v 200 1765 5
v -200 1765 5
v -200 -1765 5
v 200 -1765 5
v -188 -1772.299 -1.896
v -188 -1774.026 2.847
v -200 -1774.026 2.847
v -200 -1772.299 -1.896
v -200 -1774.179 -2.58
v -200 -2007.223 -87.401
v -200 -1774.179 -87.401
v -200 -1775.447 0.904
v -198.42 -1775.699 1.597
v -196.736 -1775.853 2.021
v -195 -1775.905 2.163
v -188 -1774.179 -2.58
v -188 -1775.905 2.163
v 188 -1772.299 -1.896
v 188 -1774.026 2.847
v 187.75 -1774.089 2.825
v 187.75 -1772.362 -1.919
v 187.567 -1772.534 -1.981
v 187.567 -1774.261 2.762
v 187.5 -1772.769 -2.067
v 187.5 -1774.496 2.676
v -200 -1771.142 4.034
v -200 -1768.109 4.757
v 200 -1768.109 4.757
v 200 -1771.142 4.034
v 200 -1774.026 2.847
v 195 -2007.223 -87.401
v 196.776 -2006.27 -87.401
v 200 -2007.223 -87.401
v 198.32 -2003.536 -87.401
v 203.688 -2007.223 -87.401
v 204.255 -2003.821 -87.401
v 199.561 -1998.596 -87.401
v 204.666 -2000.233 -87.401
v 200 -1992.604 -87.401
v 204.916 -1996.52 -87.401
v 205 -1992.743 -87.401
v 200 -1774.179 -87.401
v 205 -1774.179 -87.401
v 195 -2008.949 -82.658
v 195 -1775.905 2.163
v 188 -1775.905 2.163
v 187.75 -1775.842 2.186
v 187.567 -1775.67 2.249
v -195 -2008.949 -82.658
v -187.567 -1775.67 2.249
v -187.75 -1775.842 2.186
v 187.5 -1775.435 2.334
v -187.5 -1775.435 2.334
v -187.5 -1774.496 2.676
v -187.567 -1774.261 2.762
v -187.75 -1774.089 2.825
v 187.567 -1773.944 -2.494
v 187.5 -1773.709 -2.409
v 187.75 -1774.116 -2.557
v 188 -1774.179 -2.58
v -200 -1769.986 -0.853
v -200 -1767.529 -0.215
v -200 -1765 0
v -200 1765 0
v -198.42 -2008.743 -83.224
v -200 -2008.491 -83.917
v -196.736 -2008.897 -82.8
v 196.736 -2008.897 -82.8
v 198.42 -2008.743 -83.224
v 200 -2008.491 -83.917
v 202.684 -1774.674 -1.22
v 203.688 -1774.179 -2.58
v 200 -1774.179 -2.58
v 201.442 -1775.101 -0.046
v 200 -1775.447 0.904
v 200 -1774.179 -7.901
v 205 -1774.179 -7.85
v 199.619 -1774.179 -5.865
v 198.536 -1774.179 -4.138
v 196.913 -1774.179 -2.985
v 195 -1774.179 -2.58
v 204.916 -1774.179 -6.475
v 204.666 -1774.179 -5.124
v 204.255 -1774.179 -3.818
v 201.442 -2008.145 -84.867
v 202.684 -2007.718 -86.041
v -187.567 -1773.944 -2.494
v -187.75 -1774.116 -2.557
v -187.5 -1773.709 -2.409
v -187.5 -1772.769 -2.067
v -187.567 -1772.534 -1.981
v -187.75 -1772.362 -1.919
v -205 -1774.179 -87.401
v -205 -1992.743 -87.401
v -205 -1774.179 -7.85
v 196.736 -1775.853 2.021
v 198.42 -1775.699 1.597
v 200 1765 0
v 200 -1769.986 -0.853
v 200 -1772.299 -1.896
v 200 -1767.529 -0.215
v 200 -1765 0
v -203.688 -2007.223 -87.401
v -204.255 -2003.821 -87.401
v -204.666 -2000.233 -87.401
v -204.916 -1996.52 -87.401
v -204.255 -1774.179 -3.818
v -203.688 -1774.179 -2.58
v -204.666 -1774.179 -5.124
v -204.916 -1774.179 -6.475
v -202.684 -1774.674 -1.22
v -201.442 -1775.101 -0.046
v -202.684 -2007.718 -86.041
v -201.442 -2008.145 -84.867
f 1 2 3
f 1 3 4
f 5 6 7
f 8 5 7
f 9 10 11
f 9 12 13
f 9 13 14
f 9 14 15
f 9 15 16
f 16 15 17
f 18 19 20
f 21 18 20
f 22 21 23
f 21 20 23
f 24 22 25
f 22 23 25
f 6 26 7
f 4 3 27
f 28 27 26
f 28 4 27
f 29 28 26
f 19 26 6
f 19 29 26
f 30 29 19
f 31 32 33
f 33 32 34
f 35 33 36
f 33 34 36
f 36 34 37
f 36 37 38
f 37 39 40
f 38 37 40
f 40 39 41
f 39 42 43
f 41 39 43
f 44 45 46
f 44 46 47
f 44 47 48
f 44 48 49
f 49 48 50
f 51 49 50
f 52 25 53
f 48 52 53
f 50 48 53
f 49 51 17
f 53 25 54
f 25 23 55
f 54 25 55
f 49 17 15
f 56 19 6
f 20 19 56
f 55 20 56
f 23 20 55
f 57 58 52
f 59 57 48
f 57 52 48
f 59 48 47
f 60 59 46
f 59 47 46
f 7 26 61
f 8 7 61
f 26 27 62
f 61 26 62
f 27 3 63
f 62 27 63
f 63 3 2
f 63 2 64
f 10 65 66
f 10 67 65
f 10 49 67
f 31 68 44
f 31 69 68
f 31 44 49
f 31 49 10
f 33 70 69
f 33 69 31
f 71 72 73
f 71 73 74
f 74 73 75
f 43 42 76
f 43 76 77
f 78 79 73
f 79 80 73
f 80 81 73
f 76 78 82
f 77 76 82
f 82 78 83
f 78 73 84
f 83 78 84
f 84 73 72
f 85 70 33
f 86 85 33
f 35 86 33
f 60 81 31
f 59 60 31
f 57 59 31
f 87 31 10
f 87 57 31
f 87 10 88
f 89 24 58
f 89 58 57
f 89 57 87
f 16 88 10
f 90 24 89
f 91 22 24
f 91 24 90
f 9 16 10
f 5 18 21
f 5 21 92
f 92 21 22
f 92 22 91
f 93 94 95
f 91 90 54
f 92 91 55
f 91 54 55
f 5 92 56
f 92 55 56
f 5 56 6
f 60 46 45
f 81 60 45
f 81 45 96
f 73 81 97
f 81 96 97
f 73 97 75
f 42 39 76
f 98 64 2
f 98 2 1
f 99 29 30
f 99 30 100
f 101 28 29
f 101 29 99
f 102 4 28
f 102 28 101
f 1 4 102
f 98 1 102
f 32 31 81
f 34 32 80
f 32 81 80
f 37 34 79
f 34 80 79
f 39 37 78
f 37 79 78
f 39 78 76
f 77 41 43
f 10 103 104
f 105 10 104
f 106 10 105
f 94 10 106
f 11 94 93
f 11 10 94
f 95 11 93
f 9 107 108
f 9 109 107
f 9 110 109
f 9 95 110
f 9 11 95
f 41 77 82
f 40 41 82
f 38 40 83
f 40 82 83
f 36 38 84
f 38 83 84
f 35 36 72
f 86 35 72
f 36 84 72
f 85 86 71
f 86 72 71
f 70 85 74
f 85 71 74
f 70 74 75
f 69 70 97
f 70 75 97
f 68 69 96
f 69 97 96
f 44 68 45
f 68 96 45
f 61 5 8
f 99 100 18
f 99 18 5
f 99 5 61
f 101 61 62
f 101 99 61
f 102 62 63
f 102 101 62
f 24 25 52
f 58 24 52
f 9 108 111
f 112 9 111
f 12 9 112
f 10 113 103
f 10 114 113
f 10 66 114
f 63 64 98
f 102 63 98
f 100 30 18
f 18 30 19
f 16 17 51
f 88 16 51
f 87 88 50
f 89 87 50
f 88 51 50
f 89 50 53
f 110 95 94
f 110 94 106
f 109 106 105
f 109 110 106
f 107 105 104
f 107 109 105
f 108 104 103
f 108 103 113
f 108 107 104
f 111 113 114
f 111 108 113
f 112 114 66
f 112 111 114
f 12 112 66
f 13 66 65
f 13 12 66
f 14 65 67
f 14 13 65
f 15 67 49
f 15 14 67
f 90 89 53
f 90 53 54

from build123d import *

# Parameters (mm, degrees)
F0_W         = 400
F0_H         = 3530
F1_DEPTH     = 5
F3_DEPTH     = 400
F4_DEPTH     = 250
F6_DEPTH     = 1295.2249255895
F8_DEPTH     = 5
F9_T4_DEPTH  = 298
F9_T9_DEPTH  = 298
F10_T4_DEPTH = 248


# Not quite as in the source:
# - a fillet or chamfer that OpenCascade refuses, or shapes differently, is made with other operations: its cross-section is extruded or revolved along the edge and cut away or added
# - a pattern or mirror of a feature is missing from the dataset's text; its kind, count and spacing are read off the source's solid


with BuildPart() as f1:
    # F0 (on Top) → F1 (new body)
    with BuildSketch(Plane.XY):
        Rectangle(F0_W, F0_H)
    extrude(amount=F1_DEPTH)

    # F2 (on face) → F3 (join, through all)
    with BuildSketch(Plane.YZ.offset(200)):
        with BuildLine():
            Line((-1765, 0), (-1765, 5))
            ThreePointArc((-1765, 5), (-1769.6395282242, 4.4544282326), (-1774.0259368871, 2.8474777857))
            Line((-1774.0259368871, 2.8474777857), (-1772.2994889085, -1.8958990513))
            ThreePointArc((-1772.2994889085, -1.8958990513), (-1768.7708411375, -0.4817095664), (-1765, 0))
        make_face()
    extrude(amount=-F3_DEPTH)

    # F4 (add): a face of the model
    f4_faces = [f1.faces().sort_by_distance(p)[0] for p in [
        (0, -1773.1627128978, 0.4757893672),
    ]]
    extrude(f4_faces, amount=F4_DEPTH)

    # F5 (on face) → F6 (cut, through all)
    with BuildSketch(Plane(origin=(0, -208.4367747126, 572.6753319069), x_dir=(1, 0, 0), z_dir=(0, -0.3420201433, 0.9396926208))):
        with BuildLine():
            Line((200, -1668.0651872152), (200, -1666.0651872152))
            Line((200, -1666.0651872152), (188, -1666.0651872152))
            ThreePointArc((188, -1666.0651872152), (187.6464466094, -1666.2116338246), (187.5, -1666.5651872152))
            Line((187.5, -1666.5651872152), (187.5, -1667.5651872152))
            ThreePointArc((187.5, -1667.5651872152), (187.6464466094, -1667.9187406058), (188, -1668.0651872152))
            Line((188, -1668.0651872152), (200, -1668.0651872152))
        make_face()
        with BuildLine():
            ThreePointArc((-188, -1668.0651872152), (-187.6464466094, -1667.9187406058), (-187.5, -1667.5651872152))
            Line((-187.5, -1667.5651872152), (-187.5, -1666.5651872152))
            ThreePointArc((-187.5, -1666.5651872152), (-187.6464466094, -1666.2116338246), (-188, -1666.0651872152))
            Line((-188, -1666.0651872152), (-200, -1666.0651872152))
            Line((-200, -1666.0651872152), (-200, -1668.0651872152))
            Line((-200, -1668.0651872152), (-188, -1668.0651872152))
        make_face()
    extrude(amount=-F6_DEPTH, mode=Mode.SUBTRACT)

    # F7 (on face) → F8 (join)
    with BuildSketch(Plane.YZ.offset(200)):
        Polygon((-1775.9053221286, 2.163437499), (-2008.9490920835, -82.6575580457), (-2007.222644105, -87.4009348827), (-1774.1788741501, -87.4009348827), (-1774.1788741501, -2.5799393379), align=None)
    f8 = extrude(amount=F8_DEPTH)

    # F8_copies: F8 across plane
    add(f8.mirror(Plane(origin=(0, 0, 0), x_dir=(0, 0, -1), z_dir=(-1, 0, 0))))

    # F9: fillet of radius 10 on 2 edges, made by hand


with BuildPart() as f9_tool2:
    # F9_s3 → F9_t4 (new body)
    with BuildSketch(Plane(origin=(0, -1543.9762318963, -561.9613908248), x_dir=(1, 0, 0), z_dir=(0, -0.9396926208, -0.3420201433))):
        with BuildLine():
            ThreePointArc((205, 599.4283590606), (202.0710678119, 606.4994268725), (195, 609.4283590606))
            Line((195, 609.4283590606), (205, 609.4283590606))
            Line((205, 609.4283590606), (205, 599.4283590606))
        make_face()
    extrude(amount=F9_T4_DEPTH)

    split(bisect_by=Plane(origin=(0, -1565.5891621744, -569.8278541213), x_dir=(1, 0, 0), z_dir=(0, -0.9396926208, -0.3420201433)), keep=Keep.TOP)


with BuildPart() as f1_1:
    add(f1.part)

    # F9_t1: cut F9_tool2
    add(f9_tool2.part, mode=Mode.SUBTRACT)


with BuildPart() as f9_tool7:
    # F9_s8 → F9_t9 (new body)
    with BuildSketch(Plane(origin=(0, -1543.9762318963, -561.9613908248), x_dir=(1, 0, 0), z_dir=(0, -0.9396926208, -0.3420201433))):
        with BuildLine():
            ThreePointArc((-205, 599.4283590606), (-202.0710678119, 606.4994268725), (-195, 609.4283590606))
            Line((-195, 609.4283590606), (-205, 609.4283590606))
            Line((-205, 609.4283590606), (-205, 599.4283590606))
        make_face()
    extrude(amount=F9_T9_DEPTH)

    split(bisect_by=Plane.XZ.offset(1774.1788741501), keep=Keep.TOP)


with BuildPart() as f1_2:
    add(f1_1.part)

    # F9_t6: cut F9_tool7
    add(f9_tool7.part, mode=Mode.SUBTRACT)

    # F10: fillet of radius 5 on 1 edges, made by hand


with BuildPart() as f10_tool2:
    # F10_s3 → F10_t4 (new body)
    with BuildSketch(Plane(origin=(0, -1567.468547416, -570.5118944079), x_dir=(1, 0, 0), z_dir=(0, -0.9396926208, -0.3420201433))):
        with BuildLine():
            ThreePointArc((195, 604.3805628643), (198.5355339059, 602.9160967702), (200, 599.3805628643))
            Line((200, 599.3805628643), (200, 604.3805628643))
            Line((200, 604.3805628643), (195, 604.3805628643))
        make_face()
    extrude(amount=F10_T4_DEPTH)

    split(bisect_by=Plane.XZ.offset(1774.1788741501), keep=Keep.TOP)

    split(bisect_by=Plane.XY.offset(-87.4009348827), keep=Keep.TOP)


with BuildPart() as f1_3:
    add(f1_2.part)

    # F10_t1: union F10_tool2
    add(f10_tool2.part)


solid = f1_3.part
